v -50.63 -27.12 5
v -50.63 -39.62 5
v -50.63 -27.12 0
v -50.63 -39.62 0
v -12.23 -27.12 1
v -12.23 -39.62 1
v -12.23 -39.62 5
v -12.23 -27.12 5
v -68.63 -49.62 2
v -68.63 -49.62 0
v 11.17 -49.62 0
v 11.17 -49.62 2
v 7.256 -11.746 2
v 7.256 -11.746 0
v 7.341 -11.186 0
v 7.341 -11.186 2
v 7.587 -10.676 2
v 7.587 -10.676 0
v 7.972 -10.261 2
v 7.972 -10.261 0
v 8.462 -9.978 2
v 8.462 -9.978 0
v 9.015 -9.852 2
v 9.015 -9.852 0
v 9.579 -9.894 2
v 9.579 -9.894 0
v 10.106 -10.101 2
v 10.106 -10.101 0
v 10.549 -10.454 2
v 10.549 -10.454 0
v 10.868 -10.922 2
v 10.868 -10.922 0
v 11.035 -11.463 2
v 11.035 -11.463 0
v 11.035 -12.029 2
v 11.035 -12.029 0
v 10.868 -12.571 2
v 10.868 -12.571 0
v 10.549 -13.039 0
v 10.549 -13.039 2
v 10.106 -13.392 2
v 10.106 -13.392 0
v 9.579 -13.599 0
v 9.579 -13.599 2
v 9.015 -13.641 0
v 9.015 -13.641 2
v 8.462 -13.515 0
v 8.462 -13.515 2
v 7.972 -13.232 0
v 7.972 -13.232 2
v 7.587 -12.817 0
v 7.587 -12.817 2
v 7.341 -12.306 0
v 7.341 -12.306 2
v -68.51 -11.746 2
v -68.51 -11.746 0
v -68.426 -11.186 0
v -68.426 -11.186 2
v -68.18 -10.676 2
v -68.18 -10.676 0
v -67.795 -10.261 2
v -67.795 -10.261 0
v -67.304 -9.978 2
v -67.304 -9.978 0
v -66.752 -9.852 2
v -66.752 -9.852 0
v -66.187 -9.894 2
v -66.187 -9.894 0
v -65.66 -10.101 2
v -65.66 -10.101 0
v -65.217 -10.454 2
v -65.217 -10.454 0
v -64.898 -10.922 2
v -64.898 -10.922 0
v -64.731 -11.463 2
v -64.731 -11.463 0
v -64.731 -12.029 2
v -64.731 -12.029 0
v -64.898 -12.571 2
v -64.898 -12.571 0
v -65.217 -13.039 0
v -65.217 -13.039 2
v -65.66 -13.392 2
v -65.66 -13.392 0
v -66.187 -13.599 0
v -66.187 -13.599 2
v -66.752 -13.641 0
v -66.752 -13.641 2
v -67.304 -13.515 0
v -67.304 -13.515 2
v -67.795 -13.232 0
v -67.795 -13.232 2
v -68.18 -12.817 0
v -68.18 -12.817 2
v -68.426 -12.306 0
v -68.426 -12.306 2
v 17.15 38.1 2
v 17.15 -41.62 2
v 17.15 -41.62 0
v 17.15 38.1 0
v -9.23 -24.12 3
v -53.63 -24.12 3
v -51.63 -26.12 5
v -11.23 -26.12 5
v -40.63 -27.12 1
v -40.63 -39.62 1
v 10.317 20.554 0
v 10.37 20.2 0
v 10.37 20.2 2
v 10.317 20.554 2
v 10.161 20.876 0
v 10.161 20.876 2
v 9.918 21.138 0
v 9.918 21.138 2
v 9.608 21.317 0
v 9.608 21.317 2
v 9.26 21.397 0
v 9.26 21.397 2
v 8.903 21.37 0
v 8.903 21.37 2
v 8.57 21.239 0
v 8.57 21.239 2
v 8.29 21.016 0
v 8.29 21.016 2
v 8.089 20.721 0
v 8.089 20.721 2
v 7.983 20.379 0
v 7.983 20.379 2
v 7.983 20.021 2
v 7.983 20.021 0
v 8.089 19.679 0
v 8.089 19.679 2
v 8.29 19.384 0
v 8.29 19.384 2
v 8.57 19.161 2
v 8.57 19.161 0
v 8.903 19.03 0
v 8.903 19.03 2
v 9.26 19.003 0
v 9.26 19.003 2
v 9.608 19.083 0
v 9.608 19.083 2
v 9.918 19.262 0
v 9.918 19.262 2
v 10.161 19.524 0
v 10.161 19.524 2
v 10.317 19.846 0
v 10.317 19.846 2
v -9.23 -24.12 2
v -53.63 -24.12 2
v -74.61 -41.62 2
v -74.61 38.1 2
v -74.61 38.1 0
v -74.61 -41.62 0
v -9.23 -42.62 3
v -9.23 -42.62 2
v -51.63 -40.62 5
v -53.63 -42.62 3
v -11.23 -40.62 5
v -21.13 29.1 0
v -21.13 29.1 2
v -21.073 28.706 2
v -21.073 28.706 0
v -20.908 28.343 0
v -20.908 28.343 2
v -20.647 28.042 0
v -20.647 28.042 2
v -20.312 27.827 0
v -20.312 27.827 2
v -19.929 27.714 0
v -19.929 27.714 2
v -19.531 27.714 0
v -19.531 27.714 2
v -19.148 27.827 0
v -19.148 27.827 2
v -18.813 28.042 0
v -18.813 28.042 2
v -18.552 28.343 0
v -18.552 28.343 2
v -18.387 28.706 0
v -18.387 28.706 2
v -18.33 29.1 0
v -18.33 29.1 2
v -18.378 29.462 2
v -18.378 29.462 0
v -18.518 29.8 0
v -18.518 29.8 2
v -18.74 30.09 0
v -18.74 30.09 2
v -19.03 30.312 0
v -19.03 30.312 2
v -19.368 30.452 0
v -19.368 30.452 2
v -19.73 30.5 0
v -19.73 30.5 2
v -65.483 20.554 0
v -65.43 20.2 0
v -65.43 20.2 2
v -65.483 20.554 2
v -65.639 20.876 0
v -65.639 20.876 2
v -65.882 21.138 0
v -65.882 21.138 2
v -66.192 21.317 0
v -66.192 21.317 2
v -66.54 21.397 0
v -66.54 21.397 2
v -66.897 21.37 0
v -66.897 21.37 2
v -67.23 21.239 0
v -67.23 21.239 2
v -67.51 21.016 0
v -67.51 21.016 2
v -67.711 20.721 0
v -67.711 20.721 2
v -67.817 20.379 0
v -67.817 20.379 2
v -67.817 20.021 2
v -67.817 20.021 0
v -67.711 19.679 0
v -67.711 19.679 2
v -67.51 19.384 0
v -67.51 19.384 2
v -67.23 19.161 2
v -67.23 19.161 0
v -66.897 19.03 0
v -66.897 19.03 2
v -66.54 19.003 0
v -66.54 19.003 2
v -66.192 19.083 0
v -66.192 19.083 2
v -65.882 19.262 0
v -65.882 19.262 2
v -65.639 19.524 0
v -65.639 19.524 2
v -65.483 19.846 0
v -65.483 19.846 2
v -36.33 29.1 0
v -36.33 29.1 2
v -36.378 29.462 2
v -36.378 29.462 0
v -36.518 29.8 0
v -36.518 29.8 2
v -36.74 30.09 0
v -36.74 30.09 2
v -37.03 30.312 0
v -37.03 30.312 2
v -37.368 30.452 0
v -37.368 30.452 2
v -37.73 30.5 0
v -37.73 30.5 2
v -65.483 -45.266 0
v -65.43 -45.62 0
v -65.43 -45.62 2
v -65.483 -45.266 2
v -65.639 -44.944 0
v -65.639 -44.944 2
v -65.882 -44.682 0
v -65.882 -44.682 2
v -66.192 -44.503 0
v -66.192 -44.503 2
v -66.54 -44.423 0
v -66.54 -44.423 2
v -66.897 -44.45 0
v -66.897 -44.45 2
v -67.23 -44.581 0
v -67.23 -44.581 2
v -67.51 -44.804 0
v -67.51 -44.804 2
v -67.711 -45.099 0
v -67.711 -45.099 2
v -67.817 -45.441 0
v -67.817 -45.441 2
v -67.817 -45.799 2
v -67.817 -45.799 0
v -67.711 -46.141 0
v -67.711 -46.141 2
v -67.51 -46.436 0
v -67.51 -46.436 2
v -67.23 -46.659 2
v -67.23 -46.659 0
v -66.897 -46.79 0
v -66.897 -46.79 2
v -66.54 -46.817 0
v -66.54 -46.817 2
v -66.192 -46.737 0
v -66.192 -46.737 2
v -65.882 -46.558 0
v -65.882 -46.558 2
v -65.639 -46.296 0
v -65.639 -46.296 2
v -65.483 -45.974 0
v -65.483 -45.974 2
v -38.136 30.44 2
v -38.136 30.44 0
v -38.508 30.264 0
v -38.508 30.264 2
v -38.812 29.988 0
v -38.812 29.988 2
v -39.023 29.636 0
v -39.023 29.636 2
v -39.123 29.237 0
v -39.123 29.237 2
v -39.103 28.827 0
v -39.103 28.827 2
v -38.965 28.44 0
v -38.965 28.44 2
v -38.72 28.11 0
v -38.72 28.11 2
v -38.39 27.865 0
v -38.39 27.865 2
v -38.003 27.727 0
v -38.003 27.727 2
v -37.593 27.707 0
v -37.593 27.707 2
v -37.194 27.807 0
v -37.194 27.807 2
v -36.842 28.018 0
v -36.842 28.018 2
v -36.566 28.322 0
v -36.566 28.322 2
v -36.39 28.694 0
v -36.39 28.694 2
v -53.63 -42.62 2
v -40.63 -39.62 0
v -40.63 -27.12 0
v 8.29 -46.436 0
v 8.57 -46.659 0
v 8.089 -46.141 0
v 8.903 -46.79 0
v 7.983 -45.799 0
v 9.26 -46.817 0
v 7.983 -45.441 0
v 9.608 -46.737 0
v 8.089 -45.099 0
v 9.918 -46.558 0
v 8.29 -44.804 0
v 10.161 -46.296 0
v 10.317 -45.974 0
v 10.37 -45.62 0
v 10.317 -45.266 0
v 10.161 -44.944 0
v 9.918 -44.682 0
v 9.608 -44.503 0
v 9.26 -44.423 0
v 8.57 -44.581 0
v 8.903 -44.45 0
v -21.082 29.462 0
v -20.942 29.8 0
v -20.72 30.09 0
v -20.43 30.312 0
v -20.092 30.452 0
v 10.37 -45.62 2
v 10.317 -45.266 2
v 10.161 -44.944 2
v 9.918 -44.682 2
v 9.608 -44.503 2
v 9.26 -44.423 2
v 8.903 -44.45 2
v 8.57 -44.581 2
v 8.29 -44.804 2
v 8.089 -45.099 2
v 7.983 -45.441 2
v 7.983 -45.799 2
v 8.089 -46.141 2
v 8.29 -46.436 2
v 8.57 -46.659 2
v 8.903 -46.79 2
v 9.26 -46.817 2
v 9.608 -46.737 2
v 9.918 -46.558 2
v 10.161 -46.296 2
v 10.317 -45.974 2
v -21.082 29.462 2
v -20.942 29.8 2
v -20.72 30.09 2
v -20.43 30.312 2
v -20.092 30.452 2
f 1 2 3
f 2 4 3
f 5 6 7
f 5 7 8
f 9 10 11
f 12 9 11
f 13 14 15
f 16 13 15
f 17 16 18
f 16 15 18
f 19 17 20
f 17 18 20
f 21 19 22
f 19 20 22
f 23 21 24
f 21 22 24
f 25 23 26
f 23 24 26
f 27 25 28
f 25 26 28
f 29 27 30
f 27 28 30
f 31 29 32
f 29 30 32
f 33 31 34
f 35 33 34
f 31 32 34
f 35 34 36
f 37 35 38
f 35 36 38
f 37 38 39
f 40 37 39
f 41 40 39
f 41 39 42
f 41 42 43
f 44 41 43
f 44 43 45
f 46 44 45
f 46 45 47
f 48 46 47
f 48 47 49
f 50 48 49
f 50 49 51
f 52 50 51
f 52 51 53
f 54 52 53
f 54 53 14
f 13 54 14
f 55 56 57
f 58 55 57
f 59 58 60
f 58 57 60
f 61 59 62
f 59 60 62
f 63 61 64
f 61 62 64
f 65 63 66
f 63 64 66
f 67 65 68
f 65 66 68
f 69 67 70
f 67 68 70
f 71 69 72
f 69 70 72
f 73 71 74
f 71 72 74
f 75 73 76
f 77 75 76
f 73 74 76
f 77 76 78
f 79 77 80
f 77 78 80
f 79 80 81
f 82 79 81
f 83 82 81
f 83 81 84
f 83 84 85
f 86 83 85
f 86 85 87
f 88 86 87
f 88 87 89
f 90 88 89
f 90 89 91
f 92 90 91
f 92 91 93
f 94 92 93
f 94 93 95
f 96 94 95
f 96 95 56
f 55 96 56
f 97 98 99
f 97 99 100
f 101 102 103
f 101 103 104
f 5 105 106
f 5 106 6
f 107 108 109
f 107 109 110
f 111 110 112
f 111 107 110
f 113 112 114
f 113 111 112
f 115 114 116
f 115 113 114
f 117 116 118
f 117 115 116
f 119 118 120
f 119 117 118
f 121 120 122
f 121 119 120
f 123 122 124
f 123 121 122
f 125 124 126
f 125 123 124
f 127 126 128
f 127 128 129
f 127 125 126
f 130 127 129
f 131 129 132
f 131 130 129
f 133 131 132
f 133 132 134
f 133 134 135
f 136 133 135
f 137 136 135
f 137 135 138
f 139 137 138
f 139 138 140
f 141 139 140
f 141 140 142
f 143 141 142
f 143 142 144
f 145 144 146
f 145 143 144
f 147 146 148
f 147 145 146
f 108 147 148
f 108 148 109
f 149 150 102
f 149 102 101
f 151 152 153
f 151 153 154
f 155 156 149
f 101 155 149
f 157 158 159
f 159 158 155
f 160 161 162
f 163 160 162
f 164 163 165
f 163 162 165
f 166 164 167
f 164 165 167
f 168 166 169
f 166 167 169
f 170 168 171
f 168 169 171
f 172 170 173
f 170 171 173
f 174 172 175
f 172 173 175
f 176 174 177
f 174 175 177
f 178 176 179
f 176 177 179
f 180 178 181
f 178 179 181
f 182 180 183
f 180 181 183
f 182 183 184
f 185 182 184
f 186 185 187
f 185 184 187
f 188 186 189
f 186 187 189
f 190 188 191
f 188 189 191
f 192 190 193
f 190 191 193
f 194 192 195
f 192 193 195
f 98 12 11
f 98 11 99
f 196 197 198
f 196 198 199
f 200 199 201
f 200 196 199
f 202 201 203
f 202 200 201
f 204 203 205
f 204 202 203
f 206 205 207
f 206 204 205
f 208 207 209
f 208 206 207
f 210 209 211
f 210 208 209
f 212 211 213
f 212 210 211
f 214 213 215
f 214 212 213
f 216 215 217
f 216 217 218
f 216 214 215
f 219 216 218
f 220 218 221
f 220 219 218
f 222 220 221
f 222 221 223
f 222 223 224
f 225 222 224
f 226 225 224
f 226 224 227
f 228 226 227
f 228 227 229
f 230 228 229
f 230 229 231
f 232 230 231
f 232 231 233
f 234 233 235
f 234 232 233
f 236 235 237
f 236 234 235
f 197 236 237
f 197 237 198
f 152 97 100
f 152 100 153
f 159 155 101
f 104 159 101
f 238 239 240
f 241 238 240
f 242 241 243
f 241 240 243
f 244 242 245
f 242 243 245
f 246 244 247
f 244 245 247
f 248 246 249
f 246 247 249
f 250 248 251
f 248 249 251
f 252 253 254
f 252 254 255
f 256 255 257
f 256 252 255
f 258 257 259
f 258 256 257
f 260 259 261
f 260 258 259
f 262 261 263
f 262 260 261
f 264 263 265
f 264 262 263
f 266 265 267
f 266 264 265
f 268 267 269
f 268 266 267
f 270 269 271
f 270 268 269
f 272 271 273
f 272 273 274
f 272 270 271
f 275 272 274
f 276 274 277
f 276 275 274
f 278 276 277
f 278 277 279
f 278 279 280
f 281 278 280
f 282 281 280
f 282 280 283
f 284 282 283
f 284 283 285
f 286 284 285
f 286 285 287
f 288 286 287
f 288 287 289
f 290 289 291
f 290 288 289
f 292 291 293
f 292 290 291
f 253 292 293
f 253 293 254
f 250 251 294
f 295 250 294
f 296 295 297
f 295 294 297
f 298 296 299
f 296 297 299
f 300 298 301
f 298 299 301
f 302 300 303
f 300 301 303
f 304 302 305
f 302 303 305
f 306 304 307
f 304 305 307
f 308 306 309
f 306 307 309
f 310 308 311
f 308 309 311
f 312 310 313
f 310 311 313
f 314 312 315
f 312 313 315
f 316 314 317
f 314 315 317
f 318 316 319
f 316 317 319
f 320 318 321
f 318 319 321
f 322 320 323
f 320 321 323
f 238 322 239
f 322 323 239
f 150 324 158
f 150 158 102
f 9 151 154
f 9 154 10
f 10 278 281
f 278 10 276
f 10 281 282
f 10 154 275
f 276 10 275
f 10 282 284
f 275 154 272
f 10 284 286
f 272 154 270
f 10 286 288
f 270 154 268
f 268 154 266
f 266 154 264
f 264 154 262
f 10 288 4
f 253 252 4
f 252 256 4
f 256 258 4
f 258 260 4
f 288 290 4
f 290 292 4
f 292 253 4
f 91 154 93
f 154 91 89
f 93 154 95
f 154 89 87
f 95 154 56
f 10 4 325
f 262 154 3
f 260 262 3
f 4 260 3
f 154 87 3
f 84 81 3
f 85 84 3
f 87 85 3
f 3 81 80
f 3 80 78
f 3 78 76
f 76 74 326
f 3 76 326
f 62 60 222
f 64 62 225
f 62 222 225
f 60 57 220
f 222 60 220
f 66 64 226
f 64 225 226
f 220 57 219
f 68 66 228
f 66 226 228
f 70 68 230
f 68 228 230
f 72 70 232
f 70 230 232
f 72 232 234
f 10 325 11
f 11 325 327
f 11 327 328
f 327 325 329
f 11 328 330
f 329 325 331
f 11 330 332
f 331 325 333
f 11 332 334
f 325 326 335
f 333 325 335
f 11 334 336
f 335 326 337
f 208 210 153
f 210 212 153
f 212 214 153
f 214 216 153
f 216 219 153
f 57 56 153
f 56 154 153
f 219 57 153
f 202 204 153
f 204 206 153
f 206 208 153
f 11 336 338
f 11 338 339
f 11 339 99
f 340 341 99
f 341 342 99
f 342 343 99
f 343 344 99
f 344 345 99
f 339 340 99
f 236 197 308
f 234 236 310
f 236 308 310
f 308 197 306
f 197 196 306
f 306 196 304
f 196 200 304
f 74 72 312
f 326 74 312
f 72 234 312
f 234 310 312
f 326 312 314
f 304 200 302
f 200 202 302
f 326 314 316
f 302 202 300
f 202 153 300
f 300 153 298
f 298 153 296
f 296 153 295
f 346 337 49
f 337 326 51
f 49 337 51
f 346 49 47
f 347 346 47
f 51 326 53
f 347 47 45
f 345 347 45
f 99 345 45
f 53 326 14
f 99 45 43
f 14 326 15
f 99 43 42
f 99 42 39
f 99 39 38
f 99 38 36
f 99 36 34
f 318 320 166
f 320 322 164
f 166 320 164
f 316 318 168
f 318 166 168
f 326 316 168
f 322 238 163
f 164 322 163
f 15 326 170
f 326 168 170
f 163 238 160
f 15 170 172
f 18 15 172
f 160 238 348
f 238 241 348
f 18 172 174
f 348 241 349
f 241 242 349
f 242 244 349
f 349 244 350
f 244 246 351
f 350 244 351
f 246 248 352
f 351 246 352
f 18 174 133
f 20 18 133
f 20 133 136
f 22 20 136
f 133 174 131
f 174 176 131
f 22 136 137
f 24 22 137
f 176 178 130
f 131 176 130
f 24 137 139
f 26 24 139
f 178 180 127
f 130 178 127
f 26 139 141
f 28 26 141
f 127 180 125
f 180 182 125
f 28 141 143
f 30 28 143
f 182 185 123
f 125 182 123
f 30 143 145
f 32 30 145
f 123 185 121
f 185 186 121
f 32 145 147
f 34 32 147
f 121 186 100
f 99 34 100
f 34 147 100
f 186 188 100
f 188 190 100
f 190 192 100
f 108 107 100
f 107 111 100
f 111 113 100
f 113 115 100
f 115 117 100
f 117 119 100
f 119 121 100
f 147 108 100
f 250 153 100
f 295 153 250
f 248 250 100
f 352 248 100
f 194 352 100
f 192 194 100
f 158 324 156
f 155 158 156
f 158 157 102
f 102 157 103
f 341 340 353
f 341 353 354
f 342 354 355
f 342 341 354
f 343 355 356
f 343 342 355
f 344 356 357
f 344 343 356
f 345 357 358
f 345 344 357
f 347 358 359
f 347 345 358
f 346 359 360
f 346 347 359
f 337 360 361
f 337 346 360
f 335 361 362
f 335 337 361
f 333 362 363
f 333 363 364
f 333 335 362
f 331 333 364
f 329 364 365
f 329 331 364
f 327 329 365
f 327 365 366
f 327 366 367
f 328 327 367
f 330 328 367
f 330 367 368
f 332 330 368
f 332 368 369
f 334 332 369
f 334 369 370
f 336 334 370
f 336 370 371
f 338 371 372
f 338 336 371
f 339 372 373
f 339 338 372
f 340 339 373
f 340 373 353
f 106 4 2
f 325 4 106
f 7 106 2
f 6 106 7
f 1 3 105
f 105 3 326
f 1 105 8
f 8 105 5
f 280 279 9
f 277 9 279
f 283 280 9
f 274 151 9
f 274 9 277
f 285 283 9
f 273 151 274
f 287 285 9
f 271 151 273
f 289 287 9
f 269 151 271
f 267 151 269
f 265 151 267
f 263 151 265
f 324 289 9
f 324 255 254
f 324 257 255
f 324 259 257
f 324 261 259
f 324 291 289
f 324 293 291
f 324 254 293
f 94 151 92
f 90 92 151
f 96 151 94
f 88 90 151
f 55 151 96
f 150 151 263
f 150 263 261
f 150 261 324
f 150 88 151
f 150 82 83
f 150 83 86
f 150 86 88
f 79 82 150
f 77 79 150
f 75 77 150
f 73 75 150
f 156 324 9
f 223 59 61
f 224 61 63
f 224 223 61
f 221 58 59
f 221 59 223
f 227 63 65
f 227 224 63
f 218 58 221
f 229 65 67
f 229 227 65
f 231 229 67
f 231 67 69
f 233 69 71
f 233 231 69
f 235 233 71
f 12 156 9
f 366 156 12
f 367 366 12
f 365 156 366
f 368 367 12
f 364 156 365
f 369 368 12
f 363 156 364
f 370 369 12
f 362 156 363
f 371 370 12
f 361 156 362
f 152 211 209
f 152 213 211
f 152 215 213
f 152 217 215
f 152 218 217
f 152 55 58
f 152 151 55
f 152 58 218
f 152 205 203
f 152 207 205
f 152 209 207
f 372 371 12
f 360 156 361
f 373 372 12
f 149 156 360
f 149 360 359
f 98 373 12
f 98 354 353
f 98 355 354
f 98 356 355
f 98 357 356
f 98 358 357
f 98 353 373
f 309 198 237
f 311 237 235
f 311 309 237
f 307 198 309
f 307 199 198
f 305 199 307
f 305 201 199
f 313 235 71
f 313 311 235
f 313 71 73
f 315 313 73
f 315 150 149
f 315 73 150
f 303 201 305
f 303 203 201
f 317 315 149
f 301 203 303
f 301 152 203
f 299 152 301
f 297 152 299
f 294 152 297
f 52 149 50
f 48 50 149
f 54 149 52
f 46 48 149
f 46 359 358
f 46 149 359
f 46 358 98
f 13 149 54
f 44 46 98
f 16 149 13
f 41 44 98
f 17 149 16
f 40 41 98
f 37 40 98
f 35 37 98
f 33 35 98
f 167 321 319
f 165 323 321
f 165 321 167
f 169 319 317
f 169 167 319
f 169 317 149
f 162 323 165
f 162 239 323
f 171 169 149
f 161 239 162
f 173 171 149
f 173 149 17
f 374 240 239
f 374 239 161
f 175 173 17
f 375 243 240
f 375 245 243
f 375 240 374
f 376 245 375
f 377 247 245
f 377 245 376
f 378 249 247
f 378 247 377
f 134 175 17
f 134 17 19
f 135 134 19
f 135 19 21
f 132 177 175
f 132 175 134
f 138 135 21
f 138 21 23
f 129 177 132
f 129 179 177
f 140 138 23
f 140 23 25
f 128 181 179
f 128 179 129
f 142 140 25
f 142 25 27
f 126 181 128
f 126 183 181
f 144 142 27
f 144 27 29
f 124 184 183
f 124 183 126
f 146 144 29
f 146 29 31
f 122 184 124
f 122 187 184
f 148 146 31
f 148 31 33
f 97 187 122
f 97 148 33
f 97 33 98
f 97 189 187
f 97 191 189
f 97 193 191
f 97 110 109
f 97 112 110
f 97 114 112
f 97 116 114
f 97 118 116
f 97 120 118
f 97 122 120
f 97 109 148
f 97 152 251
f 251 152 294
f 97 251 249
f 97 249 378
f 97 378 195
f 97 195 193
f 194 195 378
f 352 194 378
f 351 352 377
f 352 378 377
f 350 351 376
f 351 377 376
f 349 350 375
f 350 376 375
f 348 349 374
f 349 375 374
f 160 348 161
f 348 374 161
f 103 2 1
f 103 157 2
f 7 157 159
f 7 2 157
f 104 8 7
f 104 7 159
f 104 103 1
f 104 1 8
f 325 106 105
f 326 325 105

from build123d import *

# Parameters (mm, degrees)
SKETCH_1_W          = 6.2
SKETCH_1_H          = 6.2
SKETCH_1_R          = 1.2
EXTRUDE_1_DEPTH     = 2
CUT_EXTRUDE_1_DEPTH = 1
SKETCH_3_W          = 10
SKETCH_3_H          = 12.5
CUT_EXTRUDE_2_DEPTH = 1
SKETCH_4_W          = 44.4
SKETCH_4_H          = 18.5
SKETCH_4_W_2        = 38.4
SKETCH_4_H_2        = 12.5
EXTRUDE_2_DEPTH     = 3
CHAMFER_2_SIZE      = 2
SKETCH_5_W          = 6.2
SKETCH_5_H          = 6.2
EXTRUDE_3_DEPTH     = 2
CUT_EXTRUDE_3_DEPTH = 10
EXTRUDE_4_DEPTH     = 2
SKETCH_8_R          = 1.9
CUT_EXTRUDE_4_DEPTH = 10


with BuildPart() as part:
    # 草图1 → 凸台-拉伸1 (new body)
    with BuildSketch(Plane.XY):
        Polygon((-68.63, 16.2), (-64.63, 12.2), (-64.63, -37.62), (-68.63, -41.62), (-68.63, -49.62), (11.17, -49.62), (11.17, -41.62), (7.17, -37.62), (7.17, 12.2), (11.17, 16.2), (11.17, 38.1), (-68.63, 38.1), align=None)
        with Locations((-37.93, 28.38)):
            Rectangle(SKETCH_1_W, SKETCH_1_H, mode=Mode.SUBTRACT)
        with Locations((-27.73, 28.38)):
            Rectangle(SKETCH_1_W, SKETCH_1_H, mode=Mode.SUBTRACT)
        with Locations((-66.63, -45.62)):
            Circle(SKETCH_1_R, mode=Mode.SUBTRACT)
        with Locations((9.17, -45.62)):
            Circle(SKETCH_1_R, mode=Mode.SUBTRACT)
        with Locations((-66.63, 20.2)):
            Circle(SKETCH_1_R, mode=Mode.SUBTRACT)
        with Locations((9.17, 20.2)):
            Circle(SKETCH_1_R, mode=Mode.SUBTRACT)
    extrude(amount=EXTRUDE_1_DEPTH)

    # 草图2 → 切除-拉伸1 (cut)
    with BuildSketch(Plane.XY.offset(2)):
        Polygon((-12.23, -27.12), (-39.83, -27.12), (-39.83, -35.02), (-39.83, -39.62), (-12.23, -39.62), align=None)
        Polygon((-39.83, -27.12), (-50.63, -27.12), (-50.63, -39.62), (-39.83, -39.62), (-39.83, -35.02), align=None)
    extrude(amount=-CUT_EXTRUDE_1_DEPTH, mode=Mode.SUBTRACT)

    # 草图3 → 切除-拉伸2 (cut)
    with BuildSketch(Plane.XY.offset(1)):
        with Locations((-45.63, -33.37)):
            Rectangle(SKETCH_3_W, SKETCH_3_H)
    extrude(amount=-CUT_EXTRUDE_2_DEPTH, mode=Mode.SUBTRACT)

    # 草图4 → 凸台-拉伸2 (add)
    with BuildSketch(Plane.XY.offset(2)):
        with Locations((-31.43, -33.37)):
            Rectangle(SKETCH_4_W, SKETCH_4_H)
        with Locations((-31.43, -33.37)):
            Rectangle(SKETCH_4_W_2, SKETCH_4_H_2, mode=Mode.SUBTRACT)
    extrude(amount=EXTRUDE_2_DEPTH)

    # 倒角2
    chamfer_2_edges = [part.edges().sort_by_distance(p)[0] for p in [
        (-31.43, -24.12, 5),
        (-9.23, -33.37, 5),
        (-53.63, -33.37, 5),
        (-31.43, -42.62, 5),
    ]]
    chamfer(chamfer_2_edges, length=CHAMFER_2_SIZE)

    # 草图5 → 凸台-拉伸3 (add)
    with BuildSketch(Plane.XY.offset(2)):
        with Locations((-37.93, 28.38)):
            Rectangle(SKETCH_5_W, SKETCH_5_H)
        with Locations((-27.73, 28.38)):
            Rectangle(SKETCH_5_W, SKETCH_5_H)
    extrude(amount=-EXTRUDE_3_DEPTH)

    # 草图6 → 切除-拉伸3 (cut)
    with BuildSketch(Plane.XY.offset(2)):
        with BuildLine():
            Line((-37.73, 30.5), (-37.73, 29.1))
            Line((-37.73, 29.1), (-36.33, 29.1))
            ThreePointArc((-36.33, 29.1), (-36.740050506, 30.089949494), (-37.73, 30.5))
        make_face()
        with BuildLine():
            Line((-36.33, 29.1), (-37.73, 29.1))
            Line((-37.73, 29.1), (-37.73, 30.5))
            ThreePointArc((-37.73, 30.5), (-38.719949494, 28.110050506), (-36.33, 29.1))
        make_face()
        with BuildLine():
            ThreePointArc((-19.73, 30.5), (-20.719949494, 30.089949494), (-21.13, 29.1))
            Line((-21.13, 29.1), (-19.73, 29.1))
            Line((-19.73, 29.1), (-19.73, 30.5))
        make_face()
        with BuildLine():
            Line((-19.73, 29.1), (-21.13, 29.1))
            ThreePointArc((-21.13, 29.1), (-19.73, 27.7), (-18.33, 29.1))
            ThreePointArc((-18.33, 29.1), (-18.740050506, 30.089949494), (-19.73, 30.5))
            Line((-19.73, 30.5), (-19.73, 29.1))
        make_face()
    extrude(amount=-CUT_EXTRUDE_3_DEPTH, mode=Mode.SUBTRACT)

    # 草图7 → 凸台-拉伸4 (add)
    with BuildSketch(Plane.XY.offset(2)):
        Polygon((-68.63, 38.1), (-74.61, 38.1), (-74.61, -41.62), (-68.63, -41.62), (-64.63, -37.62), (-64.63, 12.2), (-68.63, 16.2), align=None)
        Polygon((17.15, 38.1), (11.17, 38.1), (11.17, 16.2), (7.17, 12.2), (7.17, -37.62), (11.17, -41.62), (17.15, -41.62), align=None)
        Polygon((11.17, -41.62), (11.17, -49.62), (17.15, -41.62), align=None)
        Polygon((-68.63, -41.62), (-74.61, -41.62), (-68.63, -49.62), align=None)
    extrude(amount=-EXTRUDE_4_DEPTH)

    # 草图8 → 切除-拉伸4 (cut)
    with BuildSketch(Plane(origin=(0, 0, 0), x_dir=(-1, 0, 0), z_dir=(0, 0, -1))):
        with Locations((66.61, -11.746314383)):
            Circle(SKETCH_8_R)
        with Locations((-9.156491604, -11.746314383)):
            Circle(SKETCH_8_R)
    extrude(amount=-CUT_EXTRUDE_4_DEPTH, mode=Mode.SUBTRACT)


solid = part.part
